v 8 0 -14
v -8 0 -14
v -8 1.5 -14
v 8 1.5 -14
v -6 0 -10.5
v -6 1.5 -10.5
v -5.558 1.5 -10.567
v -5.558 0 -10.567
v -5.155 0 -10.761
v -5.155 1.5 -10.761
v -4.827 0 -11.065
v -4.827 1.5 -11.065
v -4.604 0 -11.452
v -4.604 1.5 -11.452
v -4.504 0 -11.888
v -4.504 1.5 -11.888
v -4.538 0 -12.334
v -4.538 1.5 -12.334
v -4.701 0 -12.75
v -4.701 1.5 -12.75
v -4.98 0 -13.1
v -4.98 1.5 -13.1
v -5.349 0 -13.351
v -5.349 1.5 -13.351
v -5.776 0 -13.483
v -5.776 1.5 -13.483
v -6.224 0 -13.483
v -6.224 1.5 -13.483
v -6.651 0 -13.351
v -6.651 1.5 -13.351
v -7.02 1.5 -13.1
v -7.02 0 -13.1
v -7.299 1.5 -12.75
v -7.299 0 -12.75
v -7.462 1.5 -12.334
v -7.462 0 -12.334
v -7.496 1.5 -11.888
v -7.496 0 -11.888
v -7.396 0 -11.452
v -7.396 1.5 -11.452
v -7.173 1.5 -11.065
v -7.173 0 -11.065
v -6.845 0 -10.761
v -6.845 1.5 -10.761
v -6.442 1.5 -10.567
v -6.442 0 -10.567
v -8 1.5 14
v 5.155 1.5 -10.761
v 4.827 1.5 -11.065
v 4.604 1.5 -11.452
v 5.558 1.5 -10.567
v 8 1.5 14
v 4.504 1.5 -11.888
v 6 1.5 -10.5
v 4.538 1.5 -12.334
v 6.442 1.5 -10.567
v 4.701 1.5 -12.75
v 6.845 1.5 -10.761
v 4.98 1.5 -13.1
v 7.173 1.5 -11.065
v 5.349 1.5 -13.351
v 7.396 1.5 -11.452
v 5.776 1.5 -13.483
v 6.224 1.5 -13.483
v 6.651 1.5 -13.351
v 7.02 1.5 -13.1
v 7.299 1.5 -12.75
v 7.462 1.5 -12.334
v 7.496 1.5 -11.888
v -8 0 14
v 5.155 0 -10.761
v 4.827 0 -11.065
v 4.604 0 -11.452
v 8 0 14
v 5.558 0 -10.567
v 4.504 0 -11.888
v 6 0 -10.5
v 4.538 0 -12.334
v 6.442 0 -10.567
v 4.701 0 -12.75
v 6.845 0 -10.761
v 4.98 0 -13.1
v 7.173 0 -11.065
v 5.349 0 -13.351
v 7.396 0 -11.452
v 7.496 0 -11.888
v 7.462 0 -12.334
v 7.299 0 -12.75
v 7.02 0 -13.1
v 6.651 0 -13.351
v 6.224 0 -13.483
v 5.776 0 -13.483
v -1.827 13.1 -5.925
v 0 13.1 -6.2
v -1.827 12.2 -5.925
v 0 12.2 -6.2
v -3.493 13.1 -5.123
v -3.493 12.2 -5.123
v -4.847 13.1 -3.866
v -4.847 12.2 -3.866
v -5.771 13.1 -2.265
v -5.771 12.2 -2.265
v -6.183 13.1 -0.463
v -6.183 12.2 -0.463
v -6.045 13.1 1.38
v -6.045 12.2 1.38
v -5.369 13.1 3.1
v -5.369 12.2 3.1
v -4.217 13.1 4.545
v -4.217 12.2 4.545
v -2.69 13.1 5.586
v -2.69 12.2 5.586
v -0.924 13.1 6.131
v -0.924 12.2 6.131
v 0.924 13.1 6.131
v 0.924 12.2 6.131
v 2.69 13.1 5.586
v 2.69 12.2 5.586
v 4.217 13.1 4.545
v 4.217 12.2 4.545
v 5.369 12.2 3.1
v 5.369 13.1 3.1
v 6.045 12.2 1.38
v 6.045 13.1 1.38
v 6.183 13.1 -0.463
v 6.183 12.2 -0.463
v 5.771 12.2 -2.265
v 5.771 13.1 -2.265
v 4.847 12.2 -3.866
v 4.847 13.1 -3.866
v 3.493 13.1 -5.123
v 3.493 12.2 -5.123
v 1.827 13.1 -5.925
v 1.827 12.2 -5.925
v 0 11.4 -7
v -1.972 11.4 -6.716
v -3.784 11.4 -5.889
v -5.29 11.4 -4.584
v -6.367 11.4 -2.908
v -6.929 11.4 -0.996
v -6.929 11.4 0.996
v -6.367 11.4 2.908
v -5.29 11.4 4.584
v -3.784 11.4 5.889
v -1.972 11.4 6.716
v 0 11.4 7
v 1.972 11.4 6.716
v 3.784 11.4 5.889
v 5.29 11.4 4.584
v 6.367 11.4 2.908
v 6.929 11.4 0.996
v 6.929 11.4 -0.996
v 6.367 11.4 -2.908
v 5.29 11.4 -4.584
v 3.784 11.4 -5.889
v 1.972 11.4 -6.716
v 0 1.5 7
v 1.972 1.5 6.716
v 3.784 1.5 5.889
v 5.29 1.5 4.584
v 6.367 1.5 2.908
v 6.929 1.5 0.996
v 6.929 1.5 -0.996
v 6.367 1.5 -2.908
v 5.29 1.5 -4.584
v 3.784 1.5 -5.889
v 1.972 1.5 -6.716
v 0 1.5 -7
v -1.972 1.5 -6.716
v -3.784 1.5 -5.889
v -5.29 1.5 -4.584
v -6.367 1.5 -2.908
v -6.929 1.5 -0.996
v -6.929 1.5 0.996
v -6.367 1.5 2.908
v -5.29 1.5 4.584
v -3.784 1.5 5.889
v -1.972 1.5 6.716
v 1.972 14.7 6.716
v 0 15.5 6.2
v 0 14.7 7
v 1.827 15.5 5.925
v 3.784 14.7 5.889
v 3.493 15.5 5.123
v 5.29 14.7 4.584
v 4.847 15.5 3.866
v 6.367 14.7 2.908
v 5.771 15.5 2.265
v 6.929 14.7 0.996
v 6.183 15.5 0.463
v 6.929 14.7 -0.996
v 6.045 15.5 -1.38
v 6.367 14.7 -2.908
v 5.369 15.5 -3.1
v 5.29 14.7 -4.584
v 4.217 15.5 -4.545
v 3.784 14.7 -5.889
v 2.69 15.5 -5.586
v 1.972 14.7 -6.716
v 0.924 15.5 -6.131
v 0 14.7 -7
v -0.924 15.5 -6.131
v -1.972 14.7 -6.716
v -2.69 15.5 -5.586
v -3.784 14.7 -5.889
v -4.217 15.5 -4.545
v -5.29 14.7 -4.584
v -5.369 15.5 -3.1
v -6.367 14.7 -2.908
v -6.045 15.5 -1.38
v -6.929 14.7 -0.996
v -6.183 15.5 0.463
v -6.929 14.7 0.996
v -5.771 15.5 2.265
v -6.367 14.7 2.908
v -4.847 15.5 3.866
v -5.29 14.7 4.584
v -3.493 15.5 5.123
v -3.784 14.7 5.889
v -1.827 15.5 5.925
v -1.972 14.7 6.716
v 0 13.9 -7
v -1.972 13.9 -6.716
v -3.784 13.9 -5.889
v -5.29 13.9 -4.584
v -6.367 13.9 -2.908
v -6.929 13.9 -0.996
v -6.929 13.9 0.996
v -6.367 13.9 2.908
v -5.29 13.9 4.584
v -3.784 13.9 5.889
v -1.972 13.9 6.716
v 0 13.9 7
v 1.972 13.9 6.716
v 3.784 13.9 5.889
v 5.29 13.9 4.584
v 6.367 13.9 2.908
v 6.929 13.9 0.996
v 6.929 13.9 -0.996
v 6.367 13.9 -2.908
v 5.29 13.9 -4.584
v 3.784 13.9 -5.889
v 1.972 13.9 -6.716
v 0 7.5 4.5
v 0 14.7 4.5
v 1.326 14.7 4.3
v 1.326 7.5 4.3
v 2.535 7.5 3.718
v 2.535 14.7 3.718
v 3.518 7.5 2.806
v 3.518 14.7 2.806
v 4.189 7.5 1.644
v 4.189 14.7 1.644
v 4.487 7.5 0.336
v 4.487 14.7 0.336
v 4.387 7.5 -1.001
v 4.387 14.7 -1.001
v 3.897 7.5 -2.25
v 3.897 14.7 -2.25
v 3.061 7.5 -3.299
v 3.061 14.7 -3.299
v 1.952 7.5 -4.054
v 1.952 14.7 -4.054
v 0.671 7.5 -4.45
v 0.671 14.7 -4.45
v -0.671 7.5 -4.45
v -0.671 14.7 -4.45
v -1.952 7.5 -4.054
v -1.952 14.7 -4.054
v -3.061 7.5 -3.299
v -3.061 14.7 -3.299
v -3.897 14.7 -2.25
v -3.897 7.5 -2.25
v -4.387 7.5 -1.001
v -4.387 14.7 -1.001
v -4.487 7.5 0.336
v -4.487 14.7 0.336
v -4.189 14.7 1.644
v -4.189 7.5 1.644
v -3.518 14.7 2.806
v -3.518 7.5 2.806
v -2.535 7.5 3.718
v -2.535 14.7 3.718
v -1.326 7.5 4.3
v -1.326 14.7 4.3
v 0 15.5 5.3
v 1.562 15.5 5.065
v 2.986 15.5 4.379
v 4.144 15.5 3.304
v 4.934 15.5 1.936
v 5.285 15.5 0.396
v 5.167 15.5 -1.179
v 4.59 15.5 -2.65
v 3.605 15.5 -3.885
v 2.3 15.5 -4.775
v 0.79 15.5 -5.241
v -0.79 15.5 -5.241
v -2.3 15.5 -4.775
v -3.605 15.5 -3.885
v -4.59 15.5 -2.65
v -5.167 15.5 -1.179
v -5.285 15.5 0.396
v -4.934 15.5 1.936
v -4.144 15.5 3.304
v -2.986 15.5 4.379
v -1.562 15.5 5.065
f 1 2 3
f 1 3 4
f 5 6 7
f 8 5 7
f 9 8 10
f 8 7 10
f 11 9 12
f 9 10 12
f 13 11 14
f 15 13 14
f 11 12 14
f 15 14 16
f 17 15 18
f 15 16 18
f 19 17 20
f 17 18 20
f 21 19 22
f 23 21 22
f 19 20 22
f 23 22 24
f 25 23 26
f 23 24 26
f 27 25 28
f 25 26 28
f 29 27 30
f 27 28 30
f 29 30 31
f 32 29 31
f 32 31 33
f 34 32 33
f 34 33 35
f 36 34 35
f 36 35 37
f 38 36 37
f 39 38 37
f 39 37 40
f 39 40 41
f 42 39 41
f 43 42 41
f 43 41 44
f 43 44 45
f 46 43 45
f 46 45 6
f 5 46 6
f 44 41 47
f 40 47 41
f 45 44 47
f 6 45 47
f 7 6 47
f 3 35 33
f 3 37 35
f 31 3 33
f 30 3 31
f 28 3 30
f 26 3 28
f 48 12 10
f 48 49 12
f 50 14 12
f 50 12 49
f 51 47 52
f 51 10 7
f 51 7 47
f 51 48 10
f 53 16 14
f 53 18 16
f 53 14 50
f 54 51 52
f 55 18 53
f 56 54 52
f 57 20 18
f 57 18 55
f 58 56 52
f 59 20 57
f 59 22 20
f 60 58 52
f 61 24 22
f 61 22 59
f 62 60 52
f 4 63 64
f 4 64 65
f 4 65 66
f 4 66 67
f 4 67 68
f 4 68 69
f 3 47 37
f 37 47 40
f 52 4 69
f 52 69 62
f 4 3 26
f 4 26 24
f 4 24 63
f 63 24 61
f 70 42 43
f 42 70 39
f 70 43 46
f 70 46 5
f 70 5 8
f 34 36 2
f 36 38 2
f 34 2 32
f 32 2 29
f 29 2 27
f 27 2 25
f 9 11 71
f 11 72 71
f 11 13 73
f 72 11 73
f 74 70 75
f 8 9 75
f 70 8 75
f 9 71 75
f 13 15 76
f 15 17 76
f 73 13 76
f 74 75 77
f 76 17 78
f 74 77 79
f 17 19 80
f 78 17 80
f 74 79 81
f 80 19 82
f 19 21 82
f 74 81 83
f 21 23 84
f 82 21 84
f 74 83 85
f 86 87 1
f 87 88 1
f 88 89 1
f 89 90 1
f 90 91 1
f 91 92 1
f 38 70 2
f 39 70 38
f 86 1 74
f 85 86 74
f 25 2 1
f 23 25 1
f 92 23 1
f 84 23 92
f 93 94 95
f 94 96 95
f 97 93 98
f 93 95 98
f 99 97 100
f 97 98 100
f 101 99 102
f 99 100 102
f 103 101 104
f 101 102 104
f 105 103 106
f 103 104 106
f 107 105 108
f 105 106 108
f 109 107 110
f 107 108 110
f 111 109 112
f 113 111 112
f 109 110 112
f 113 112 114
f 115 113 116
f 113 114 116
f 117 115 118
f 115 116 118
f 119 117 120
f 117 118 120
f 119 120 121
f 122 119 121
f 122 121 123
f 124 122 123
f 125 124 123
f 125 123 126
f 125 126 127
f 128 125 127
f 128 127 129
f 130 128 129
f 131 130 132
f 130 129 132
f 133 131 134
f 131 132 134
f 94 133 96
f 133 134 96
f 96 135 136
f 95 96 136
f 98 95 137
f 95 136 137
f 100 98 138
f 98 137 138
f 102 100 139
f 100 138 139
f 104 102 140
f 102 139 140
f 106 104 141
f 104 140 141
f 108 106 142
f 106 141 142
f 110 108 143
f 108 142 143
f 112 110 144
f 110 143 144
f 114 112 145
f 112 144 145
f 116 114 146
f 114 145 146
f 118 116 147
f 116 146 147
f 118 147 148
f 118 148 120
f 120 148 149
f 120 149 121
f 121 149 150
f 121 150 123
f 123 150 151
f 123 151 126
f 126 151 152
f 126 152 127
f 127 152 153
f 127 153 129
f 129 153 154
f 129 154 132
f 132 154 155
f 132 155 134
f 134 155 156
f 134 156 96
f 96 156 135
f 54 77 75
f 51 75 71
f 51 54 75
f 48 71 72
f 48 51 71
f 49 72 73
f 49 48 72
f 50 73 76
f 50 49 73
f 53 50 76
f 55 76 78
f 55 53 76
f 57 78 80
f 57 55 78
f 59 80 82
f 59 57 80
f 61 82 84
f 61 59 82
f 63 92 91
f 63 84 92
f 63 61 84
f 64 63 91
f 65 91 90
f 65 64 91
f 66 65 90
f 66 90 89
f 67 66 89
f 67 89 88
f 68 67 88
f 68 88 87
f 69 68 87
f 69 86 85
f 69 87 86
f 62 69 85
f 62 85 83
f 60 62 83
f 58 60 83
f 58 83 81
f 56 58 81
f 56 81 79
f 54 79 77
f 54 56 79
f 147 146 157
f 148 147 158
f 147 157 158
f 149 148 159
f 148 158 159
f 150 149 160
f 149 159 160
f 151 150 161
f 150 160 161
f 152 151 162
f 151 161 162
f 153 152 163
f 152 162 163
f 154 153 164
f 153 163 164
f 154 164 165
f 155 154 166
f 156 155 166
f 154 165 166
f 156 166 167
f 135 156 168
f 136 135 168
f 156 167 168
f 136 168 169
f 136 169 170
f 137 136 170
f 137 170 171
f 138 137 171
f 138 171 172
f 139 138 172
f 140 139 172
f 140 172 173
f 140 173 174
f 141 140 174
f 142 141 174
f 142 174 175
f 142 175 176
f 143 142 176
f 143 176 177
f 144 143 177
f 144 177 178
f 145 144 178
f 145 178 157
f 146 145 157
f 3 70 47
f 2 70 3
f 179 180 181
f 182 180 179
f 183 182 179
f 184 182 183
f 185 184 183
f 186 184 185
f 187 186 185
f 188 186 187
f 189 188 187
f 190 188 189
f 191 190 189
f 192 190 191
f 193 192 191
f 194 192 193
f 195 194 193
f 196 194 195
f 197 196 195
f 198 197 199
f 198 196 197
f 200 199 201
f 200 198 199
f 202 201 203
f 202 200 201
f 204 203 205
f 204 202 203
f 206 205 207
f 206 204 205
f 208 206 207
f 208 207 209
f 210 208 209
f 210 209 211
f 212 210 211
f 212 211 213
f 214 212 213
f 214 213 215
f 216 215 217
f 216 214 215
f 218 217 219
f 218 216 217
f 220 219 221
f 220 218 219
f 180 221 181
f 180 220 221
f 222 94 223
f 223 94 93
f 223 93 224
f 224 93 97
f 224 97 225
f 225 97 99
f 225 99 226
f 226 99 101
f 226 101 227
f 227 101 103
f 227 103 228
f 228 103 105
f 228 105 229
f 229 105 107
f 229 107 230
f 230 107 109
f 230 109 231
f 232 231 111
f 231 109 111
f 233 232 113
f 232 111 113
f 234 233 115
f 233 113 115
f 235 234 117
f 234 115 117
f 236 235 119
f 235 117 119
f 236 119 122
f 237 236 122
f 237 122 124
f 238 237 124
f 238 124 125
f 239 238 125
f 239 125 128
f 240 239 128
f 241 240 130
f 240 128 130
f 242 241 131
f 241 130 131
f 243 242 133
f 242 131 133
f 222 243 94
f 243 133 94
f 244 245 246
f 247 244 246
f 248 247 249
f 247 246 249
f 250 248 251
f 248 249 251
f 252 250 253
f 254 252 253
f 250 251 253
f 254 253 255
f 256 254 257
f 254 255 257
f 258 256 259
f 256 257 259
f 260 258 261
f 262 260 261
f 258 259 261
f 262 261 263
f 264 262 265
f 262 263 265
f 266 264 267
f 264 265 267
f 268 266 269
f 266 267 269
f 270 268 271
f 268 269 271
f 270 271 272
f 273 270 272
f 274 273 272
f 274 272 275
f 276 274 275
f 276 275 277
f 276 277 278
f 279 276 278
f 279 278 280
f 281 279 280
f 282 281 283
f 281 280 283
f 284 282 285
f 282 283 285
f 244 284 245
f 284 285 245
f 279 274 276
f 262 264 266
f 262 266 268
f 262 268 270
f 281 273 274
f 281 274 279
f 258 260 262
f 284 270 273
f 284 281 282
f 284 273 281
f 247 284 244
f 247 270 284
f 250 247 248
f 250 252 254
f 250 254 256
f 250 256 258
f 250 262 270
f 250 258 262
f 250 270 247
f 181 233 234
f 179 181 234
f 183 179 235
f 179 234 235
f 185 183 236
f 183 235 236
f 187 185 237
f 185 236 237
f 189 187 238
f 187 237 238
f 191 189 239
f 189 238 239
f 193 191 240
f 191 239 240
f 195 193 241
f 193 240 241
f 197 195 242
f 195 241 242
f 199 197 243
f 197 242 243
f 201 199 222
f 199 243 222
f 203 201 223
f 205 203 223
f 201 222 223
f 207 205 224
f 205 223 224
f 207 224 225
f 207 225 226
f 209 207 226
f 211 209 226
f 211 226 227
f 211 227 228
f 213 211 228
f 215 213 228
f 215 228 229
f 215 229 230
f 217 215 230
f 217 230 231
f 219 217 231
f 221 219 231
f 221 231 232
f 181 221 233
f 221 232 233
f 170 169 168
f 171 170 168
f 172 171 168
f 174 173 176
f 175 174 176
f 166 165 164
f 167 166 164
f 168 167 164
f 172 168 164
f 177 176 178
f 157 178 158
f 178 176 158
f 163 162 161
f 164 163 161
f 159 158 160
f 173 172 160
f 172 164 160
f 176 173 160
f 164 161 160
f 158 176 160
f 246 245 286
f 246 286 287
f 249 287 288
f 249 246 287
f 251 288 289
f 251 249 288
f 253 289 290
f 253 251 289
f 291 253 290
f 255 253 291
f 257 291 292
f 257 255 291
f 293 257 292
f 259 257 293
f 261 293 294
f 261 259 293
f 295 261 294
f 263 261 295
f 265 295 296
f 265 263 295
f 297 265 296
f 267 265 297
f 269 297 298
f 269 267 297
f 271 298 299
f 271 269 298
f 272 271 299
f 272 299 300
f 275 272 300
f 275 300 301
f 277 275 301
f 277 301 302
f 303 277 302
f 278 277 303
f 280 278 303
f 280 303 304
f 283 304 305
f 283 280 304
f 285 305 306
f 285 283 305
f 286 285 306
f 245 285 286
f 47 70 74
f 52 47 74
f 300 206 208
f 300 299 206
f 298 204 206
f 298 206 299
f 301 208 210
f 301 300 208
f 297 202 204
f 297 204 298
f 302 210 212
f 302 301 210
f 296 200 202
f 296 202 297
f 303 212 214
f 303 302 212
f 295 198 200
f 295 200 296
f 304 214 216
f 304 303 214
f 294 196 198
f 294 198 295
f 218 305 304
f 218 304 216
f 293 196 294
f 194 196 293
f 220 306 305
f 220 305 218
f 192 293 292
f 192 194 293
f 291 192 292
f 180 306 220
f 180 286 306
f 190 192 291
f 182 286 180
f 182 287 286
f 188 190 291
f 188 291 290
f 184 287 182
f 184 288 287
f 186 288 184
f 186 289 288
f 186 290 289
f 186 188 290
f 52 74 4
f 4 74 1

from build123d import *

# Parameters (mm, degrees)
SKETCH1_W           = 16
SKETCH1_H           = 28
BOSS_EXTRUDE1_DEPTH = 1.5
SKETCH5_R           = 1.5
CUT_EXTRUDE2_DEPTH  = 17.194134741
SKETCH2_R           = 7
BOSS_EXTRUDE2_DEPTH = 14
CHAMFER1_SIZE       = 0.8
SKETCH4_R           = 4.5
CUT_EXTRUDE1_DEPTH  = 8
CHAMFER2_SIZE       = 0.8


with BuildPart() as part:
    # Sketch1 → Boss-Extrude1 (new body)
    with BuildSketch(Plane(origin=(0, 0, 0), x_dir=(1, 0, 0), z_dir=(0, 1, 0))):
        Rectangle(SKETCH1_W, SKETCH1_H)
    extrude(amount=BOSS_EXTRUDE1_DEPTH)

    # Sketch5 → Cut-Extrude2 (cut, through all)
    with BuildSketch(Plane(origin=(0, 1.5, 0), x_dir=(1, 0, 0), z_dir=(0, 1, 0))):
        with Locations(Location((-6, 12, 0), (0, 0, 270))):
            Circle(SKETCH5_R)
    cut_extrude2 = extrude(amount=-CUT_EXTRUDE2_DEPTH, mode=Mode.SUBTRACT)

    # Mirror1: Cut-Extrude2 across plane
    add(cut_extrude2.mirror(Plane(origin=(0, 0, 0), x_dir=(0, 0, 1), z_dir=(1, 0, 0))), mode=Mode.SUBTRACT)


with BuildPart() as body_2:
    # Sketch2 → Boss-Extrude2 (new body)
    with BuildSketch(Plane(origin=(0, 1.5, 0), x_dir=(1, 0, 0), z_dir=(0, 1, 0))):
        with Locations(Location((0, 0, 0), (0, 0, 270))):
            Circle(SKETCH2_R)
    extrude(amount=BOSS_EXTRUDE2_DEPTH)

    # Chamfer1
    chamfer1_edges = [body_2.edges().sort_by_distance(p)[0] for p in [
        (0, 15.5, -7),
    ]]
    chamfer(chamfer1_edges, length=CHAMFER1_SIZE)

    # Sketch3 → Cut-Revolve1 (revolve, cut)
    with BuildSketch(Plane(origin=(0, 0, 0), x_dir=(0, 0, -1), z_dir=(1, 0, 0))):
        Polygon((7, 13.9), (6.2, 13.1), (6.2, 12.2), (7, 11.4), align=None)
    revolve(axis=Axis((0, -1000, 0), (0, 1, 0)), mode=Mode.SUBTRACT)

    # Sketch4 → Cut-Extrude1 (cut)
    with BuildSketch(Plane(origin=(0, 15.5, 0), x_dir=(1, 0, 0), z_dir=(0, 1, 0))):
        with Locations(Location((0, 0, 0), (0, 0, 270))):
            Circle(SKETCH4_R)
    extrude(amount=-CUT_EXTRUDE1_DEPTH, mode=Mode.SUBTRACT)

    # Chamfer2
    chamfer2_edges = [body_2.edges().sort_by_distance(p)[0] for p in [
        (0, 15.5, -4.5),
    ]]
    chamfer(chamfer2_edges, length=CHAMFER2_SIZE)


solid = Compound([part.part, body_2.part])
